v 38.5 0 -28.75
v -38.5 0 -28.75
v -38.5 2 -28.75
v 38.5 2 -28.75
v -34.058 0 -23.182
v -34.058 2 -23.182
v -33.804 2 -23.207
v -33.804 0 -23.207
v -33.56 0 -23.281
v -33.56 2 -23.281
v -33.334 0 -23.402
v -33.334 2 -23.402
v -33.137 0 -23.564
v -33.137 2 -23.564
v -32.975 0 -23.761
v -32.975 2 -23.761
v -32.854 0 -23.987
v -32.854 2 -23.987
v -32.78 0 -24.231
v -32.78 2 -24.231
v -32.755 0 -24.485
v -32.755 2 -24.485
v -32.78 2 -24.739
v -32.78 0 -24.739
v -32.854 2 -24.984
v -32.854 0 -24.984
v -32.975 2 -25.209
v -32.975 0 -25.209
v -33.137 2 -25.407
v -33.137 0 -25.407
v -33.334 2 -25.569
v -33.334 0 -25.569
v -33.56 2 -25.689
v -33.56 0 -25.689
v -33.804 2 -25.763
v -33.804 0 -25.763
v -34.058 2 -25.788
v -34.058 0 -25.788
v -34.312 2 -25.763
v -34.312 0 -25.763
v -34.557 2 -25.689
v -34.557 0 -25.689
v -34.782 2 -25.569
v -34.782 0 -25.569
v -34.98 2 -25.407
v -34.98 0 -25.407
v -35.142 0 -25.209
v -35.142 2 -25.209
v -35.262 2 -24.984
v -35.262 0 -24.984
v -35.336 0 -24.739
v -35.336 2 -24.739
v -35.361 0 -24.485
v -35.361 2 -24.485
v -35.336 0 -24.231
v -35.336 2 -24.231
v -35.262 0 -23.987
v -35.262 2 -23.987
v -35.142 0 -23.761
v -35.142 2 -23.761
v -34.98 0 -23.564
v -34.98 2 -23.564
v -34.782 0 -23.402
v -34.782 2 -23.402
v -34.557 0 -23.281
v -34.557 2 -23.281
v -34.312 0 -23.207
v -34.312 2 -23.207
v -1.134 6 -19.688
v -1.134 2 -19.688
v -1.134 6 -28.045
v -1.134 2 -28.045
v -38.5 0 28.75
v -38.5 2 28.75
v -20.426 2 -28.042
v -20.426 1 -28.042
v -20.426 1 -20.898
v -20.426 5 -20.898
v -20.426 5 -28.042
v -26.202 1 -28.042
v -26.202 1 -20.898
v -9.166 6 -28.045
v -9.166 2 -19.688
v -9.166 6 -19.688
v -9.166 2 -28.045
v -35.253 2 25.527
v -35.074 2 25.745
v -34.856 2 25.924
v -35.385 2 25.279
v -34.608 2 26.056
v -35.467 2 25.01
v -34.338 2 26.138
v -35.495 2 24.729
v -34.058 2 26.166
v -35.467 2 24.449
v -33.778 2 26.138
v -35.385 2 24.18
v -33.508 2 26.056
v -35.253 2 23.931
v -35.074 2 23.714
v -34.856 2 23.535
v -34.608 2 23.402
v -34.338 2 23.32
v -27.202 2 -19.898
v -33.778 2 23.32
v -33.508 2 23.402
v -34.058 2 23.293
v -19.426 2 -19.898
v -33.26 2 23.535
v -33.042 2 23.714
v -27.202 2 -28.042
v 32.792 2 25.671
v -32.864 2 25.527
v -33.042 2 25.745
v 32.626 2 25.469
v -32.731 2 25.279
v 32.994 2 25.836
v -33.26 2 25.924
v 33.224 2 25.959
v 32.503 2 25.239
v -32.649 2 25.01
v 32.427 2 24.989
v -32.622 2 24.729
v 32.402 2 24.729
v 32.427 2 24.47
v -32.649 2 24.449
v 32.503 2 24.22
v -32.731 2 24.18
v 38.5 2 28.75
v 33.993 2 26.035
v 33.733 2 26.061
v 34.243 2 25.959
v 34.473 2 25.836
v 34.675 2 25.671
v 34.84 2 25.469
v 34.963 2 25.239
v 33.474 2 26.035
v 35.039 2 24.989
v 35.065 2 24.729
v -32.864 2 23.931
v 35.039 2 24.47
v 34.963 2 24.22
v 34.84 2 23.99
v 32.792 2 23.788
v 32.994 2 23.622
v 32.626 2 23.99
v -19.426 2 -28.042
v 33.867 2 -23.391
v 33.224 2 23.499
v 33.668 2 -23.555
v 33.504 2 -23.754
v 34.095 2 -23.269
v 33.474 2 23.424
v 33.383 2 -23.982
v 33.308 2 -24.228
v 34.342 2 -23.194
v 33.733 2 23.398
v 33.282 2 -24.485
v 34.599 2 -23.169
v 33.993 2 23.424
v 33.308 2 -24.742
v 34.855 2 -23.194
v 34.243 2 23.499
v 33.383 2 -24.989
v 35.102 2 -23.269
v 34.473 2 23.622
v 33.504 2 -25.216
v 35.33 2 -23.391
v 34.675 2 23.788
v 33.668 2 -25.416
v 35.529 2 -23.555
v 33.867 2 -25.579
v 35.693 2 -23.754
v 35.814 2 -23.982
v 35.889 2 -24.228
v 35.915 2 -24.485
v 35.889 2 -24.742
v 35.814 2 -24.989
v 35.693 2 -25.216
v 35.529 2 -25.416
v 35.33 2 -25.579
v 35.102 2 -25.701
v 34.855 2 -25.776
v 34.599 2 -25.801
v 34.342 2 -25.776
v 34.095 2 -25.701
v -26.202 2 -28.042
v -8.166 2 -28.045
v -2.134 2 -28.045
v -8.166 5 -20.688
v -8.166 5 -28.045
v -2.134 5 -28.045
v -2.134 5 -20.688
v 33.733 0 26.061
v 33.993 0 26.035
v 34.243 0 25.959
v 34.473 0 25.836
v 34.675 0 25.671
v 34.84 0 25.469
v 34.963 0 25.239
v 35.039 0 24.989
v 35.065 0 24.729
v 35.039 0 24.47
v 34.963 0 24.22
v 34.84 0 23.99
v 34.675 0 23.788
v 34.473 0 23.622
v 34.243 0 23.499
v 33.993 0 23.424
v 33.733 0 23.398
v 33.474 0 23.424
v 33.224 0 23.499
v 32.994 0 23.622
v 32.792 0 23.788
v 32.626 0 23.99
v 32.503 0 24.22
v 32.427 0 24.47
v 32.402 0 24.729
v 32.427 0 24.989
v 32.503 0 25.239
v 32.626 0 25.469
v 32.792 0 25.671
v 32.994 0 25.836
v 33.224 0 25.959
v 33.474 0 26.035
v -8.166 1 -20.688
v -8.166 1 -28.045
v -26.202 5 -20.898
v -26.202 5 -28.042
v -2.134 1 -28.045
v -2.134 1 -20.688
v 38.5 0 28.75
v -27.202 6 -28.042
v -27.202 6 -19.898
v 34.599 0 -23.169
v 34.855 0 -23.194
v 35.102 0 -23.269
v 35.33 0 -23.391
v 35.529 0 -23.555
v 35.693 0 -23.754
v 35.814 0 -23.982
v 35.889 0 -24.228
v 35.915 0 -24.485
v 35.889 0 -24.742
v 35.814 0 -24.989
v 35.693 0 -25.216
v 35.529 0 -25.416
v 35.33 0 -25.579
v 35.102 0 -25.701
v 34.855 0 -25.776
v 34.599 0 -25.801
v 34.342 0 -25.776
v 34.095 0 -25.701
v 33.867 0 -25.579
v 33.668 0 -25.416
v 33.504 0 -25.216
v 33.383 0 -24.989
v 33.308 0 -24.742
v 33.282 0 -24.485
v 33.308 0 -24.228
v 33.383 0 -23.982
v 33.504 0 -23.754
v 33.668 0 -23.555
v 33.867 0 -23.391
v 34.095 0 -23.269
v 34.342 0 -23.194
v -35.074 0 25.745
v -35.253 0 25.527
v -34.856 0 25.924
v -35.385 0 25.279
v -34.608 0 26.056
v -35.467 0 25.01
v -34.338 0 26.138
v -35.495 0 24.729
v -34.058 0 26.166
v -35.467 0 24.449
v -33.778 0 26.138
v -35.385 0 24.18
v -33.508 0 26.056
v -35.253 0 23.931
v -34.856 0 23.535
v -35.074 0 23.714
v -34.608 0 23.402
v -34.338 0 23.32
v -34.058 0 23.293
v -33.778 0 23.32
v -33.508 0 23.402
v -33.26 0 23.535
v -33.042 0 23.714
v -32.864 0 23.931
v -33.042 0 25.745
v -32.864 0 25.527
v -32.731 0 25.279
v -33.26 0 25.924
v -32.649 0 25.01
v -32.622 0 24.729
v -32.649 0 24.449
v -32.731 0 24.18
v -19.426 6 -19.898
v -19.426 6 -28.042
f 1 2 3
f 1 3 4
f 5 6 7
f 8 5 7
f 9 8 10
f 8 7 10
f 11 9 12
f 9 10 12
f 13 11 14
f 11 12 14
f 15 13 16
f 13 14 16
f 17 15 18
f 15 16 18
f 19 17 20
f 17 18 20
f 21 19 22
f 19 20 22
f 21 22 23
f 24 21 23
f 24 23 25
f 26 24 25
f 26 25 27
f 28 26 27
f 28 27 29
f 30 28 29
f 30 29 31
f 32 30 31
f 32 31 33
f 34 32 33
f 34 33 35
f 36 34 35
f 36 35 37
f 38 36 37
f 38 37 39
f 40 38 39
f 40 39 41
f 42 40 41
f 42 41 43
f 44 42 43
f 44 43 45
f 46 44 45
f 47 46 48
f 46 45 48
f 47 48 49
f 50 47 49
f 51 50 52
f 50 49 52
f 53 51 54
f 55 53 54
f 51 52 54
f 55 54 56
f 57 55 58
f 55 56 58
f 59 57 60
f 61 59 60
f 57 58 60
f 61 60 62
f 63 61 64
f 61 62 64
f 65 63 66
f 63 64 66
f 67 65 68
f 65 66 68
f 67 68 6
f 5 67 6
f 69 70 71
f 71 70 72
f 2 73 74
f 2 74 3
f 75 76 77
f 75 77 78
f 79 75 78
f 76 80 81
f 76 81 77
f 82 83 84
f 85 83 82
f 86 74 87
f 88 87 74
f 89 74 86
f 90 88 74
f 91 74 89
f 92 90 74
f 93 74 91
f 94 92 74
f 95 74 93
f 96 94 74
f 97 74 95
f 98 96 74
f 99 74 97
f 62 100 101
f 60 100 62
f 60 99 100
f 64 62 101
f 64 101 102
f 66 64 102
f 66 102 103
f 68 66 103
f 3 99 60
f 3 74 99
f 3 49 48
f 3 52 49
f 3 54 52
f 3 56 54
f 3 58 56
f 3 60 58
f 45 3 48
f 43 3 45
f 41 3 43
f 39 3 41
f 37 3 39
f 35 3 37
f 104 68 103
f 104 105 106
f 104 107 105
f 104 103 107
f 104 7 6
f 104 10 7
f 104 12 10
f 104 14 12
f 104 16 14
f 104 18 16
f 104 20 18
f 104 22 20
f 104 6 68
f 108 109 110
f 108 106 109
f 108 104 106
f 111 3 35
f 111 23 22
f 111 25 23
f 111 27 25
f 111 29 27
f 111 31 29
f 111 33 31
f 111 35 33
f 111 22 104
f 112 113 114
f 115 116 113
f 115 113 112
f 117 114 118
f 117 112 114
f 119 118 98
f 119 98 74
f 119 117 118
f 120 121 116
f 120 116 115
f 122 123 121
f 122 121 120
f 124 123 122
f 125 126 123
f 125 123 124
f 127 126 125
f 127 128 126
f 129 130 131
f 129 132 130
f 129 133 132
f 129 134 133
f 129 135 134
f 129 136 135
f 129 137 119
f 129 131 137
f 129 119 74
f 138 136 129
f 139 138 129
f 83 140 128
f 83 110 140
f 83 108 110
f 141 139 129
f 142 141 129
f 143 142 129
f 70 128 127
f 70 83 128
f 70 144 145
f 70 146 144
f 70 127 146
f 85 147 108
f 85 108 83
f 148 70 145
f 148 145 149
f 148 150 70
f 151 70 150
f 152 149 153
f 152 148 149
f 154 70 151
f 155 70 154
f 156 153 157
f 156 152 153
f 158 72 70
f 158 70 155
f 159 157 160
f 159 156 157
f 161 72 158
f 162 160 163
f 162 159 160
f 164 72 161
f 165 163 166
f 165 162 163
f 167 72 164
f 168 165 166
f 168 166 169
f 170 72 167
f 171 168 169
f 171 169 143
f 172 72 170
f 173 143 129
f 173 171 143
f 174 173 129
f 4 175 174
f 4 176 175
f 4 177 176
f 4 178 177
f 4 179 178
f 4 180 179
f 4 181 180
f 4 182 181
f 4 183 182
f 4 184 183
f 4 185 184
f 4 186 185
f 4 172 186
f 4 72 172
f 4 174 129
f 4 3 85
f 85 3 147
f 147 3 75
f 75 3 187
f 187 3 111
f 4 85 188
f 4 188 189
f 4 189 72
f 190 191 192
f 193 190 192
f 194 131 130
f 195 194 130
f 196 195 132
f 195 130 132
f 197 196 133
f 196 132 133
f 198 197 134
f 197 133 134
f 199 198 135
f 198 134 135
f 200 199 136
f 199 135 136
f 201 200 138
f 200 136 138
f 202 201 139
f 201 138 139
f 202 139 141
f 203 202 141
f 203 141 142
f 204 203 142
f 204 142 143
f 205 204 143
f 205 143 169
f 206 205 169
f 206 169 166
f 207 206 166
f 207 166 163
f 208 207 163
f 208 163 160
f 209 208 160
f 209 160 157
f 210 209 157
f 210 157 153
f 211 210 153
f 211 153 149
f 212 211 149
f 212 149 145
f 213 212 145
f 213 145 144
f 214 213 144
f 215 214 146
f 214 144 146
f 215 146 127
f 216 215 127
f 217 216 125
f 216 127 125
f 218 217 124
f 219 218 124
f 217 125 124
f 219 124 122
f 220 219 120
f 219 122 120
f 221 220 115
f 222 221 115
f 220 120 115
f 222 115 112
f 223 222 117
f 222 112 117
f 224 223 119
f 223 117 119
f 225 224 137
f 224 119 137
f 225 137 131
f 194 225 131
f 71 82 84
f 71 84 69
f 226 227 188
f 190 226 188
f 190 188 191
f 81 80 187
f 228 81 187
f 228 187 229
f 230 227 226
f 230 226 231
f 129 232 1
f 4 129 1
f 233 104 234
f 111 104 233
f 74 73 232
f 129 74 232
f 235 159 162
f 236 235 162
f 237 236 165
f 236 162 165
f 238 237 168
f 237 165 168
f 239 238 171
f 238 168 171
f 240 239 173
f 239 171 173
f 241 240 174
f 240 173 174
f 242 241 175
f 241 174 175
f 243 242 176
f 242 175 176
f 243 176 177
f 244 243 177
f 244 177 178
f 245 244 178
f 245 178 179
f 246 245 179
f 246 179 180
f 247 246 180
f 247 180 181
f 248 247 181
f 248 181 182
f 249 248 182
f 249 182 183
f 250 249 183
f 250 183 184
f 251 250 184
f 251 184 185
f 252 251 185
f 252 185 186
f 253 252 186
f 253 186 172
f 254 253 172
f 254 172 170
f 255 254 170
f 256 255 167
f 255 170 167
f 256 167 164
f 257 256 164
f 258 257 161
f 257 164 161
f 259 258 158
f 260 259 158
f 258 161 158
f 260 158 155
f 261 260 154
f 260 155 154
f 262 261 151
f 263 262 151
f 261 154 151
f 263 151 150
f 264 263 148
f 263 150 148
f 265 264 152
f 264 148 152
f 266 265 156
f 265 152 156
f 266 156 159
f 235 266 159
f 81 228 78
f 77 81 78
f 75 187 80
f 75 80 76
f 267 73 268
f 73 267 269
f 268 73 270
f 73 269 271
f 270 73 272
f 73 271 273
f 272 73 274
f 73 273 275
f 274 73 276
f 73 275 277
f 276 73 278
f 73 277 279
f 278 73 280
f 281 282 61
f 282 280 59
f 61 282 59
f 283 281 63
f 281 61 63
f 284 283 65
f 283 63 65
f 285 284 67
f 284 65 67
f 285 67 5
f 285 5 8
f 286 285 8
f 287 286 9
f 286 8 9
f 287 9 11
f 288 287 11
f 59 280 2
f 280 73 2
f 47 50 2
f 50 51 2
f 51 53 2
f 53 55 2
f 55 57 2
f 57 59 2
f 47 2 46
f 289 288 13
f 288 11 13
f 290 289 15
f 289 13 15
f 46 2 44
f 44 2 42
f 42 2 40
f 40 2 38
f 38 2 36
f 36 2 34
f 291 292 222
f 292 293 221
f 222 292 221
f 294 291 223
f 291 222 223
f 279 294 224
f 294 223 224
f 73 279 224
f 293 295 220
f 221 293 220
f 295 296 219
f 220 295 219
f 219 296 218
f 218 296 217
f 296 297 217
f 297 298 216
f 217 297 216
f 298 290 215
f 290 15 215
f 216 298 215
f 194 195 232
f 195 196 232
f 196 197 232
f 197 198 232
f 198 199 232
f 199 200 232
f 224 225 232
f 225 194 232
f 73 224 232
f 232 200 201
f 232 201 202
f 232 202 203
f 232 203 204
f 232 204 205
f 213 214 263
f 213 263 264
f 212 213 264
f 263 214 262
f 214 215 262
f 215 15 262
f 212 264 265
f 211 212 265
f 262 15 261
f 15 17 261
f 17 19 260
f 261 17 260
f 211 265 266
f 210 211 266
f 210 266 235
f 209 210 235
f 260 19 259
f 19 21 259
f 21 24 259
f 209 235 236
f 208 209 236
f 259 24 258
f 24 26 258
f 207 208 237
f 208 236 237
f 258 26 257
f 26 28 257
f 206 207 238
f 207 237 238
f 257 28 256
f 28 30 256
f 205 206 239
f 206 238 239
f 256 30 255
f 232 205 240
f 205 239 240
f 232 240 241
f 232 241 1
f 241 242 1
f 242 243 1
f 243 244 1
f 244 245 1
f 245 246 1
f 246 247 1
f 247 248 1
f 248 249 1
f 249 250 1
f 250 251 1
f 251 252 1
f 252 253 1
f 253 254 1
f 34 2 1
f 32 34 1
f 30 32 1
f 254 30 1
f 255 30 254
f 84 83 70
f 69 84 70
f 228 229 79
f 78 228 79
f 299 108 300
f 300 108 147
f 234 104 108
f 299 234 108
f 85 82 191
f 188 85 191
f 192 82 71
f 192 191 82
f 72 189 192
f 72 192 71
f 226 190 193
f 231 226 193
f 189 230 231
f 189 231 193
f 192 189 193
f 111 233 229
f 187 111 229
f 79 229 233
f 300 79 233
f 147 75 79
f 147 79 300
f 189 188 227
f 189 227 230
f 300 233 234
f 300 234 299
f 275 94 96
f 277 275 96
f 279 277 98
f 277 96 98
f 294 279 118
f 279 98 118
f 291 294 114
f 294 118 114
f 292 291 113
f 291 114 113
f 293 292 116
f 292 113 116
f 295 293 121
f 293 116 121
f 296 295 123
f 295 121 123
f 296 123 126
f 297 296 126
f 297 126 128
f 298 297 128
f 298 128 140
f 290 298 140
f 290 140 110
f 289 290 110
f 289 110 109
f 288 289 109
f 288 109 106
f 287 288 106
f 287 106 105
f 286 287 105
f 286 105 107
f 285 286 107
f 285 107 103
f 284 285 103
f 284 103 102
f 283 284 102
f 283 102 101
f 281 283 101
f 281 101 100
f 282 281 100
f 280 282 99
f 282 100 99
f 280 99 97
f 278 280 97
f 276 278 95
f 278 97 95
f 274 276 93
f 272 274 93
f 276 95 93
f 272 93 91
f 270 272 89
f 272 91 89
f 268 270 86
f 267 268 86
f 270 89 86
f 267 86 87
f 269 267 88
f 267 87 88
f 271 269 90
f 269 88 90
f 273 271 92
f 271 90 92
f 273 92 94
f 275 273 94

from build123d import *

# Parameters (mm, degrees)
ESBO_O1_W                = 77
ESBO_O1_H                = 57.5
RESSALTO_EXTRUS_O1_DEPTH = 2
ESBO_O2_W                = 7.7755798
ESBO_O2_H                = 8.143597904
ESBO_O2_W_2              = 8.031877
ESBO_O2_H_2              = 8.356901944
RESSALTO_EXTRUS_O2_DEPTH = 4
CASCA1_START             = -28.041915429
CASCA1_OUTLINE_W         = 6.031877
CASCA1_OUTLINE_H         = 4
CASCA1_OUTLINE_W_2       = 5.7755798
CASCA1_DEPTH             = 7.143597904
CASCA1_START_2           = -28.045301573
CASCA1_2_OUTLINE_W       = 6.031877
CASCA1_2_OUTLINE_H       = 4
CASCA1_2_DEPTH           = 7.356901944
ESBO_O3_R                = 1.331315802
ESBO_O3_R_2              = 1.316034484
ESBO_O3_R_3              = 1.436459579
ESBO_O3_R_4              = 1.302946869
CORTE_EXTRUS_O1_DEPTH    = 49.216309481


# Read off the part's stored shape, not the designer's step: Casca1
with BuildPart() as part:
    # Esboço1 → Ressalto-extrusão1 (new body)
    with BuildSketch(Plane(origin=(0, 0, 0), x_dir=(1, 0, 0), z_dir=(0, 1, 0))):
        Rectangle(ESBO_O1_W, ESBO_O1_H)
    extrude(amount=RESSALTO_EXTRUS_O1_DEPTH)

    # Esboço2 → Ressalto-extrusão2 (add)
    with BuildSketch(Plane(origin=(0, 2, 0), x_dir=(1, 0, 0), z_dir=(0, 1, 0))):
        with Locations((-23.313874366, 23.970116477)):
            Rectangle(ESBO_O2_W, ESBO_O2_H)
        with Locations((-5.149923387, 23.866850601)):
            Rectangle(ESBO_O2_W_2, ESBO_O2_H_2)
    extrude(amount=RESSALTO_EXTRUS_O2_DEPTH)

    # Casca1 outline → Casca1 (cut)
    with BuildSketch(Plane.XY.offset(CASCA1_START)):
        with Locations((-5.149923387, 3)):
            Rectangle(CASCA1_OUTLINE_W, CASCA1_OUTLINE_H)
        with Locations((-23.313874366, 3)):
            Rectangle(CASCA1_OUTLINE_W_2, CASCA1_OUTLINE_H)
    extrude(amount=CASCA1_DEPTH, mode=Mode.SUBTRACT)

    # Casca1 2 outline → Casca1 2 (cut)
    with BuildSketch(Plane.XY.offset(CASCA1_START_2)):
        with Locations((-5.149923387, 3)):
            Rectangle(CASCA1_2_OUTLINE_W, CASCA1_2_OUTLINE_H)
    extrude(amount=CASCA1_2_DEPTH, mode=Mode.SUBTRACT)

    # Esboço3 → Corte-extrusão1 (cut, through all)
    with BuildSketch(Plane(origin=(0, 2, 0), x_dir=(1, 0, 0), z_dir=(0, 1, 0))):
        with Locations(Location((33.733228093, -24.729326676, 0), (0, 0, 270))):
            Circle(ESBO_O3_R)
        with Locations(Location((34.598509611, 24.48523075, 0), (0, 0, 270))):
            Circle(ESBO_O3_R_2)
        with Locations(Location((-34.058204813, -24.729326676, 0), (0, 0, 270))):
            Circle(ESBO_O3_R_3)
        with Locations(Location((-34.058204813, 24.48523075, 0), (0, 0, 270))):
            Circle(ESBO_O3_R_4)
    extrude(amount=-CORTE_EXTRUS_O1_DEPTH, mode=Mode.SUBTRACT)


solid = part.part
